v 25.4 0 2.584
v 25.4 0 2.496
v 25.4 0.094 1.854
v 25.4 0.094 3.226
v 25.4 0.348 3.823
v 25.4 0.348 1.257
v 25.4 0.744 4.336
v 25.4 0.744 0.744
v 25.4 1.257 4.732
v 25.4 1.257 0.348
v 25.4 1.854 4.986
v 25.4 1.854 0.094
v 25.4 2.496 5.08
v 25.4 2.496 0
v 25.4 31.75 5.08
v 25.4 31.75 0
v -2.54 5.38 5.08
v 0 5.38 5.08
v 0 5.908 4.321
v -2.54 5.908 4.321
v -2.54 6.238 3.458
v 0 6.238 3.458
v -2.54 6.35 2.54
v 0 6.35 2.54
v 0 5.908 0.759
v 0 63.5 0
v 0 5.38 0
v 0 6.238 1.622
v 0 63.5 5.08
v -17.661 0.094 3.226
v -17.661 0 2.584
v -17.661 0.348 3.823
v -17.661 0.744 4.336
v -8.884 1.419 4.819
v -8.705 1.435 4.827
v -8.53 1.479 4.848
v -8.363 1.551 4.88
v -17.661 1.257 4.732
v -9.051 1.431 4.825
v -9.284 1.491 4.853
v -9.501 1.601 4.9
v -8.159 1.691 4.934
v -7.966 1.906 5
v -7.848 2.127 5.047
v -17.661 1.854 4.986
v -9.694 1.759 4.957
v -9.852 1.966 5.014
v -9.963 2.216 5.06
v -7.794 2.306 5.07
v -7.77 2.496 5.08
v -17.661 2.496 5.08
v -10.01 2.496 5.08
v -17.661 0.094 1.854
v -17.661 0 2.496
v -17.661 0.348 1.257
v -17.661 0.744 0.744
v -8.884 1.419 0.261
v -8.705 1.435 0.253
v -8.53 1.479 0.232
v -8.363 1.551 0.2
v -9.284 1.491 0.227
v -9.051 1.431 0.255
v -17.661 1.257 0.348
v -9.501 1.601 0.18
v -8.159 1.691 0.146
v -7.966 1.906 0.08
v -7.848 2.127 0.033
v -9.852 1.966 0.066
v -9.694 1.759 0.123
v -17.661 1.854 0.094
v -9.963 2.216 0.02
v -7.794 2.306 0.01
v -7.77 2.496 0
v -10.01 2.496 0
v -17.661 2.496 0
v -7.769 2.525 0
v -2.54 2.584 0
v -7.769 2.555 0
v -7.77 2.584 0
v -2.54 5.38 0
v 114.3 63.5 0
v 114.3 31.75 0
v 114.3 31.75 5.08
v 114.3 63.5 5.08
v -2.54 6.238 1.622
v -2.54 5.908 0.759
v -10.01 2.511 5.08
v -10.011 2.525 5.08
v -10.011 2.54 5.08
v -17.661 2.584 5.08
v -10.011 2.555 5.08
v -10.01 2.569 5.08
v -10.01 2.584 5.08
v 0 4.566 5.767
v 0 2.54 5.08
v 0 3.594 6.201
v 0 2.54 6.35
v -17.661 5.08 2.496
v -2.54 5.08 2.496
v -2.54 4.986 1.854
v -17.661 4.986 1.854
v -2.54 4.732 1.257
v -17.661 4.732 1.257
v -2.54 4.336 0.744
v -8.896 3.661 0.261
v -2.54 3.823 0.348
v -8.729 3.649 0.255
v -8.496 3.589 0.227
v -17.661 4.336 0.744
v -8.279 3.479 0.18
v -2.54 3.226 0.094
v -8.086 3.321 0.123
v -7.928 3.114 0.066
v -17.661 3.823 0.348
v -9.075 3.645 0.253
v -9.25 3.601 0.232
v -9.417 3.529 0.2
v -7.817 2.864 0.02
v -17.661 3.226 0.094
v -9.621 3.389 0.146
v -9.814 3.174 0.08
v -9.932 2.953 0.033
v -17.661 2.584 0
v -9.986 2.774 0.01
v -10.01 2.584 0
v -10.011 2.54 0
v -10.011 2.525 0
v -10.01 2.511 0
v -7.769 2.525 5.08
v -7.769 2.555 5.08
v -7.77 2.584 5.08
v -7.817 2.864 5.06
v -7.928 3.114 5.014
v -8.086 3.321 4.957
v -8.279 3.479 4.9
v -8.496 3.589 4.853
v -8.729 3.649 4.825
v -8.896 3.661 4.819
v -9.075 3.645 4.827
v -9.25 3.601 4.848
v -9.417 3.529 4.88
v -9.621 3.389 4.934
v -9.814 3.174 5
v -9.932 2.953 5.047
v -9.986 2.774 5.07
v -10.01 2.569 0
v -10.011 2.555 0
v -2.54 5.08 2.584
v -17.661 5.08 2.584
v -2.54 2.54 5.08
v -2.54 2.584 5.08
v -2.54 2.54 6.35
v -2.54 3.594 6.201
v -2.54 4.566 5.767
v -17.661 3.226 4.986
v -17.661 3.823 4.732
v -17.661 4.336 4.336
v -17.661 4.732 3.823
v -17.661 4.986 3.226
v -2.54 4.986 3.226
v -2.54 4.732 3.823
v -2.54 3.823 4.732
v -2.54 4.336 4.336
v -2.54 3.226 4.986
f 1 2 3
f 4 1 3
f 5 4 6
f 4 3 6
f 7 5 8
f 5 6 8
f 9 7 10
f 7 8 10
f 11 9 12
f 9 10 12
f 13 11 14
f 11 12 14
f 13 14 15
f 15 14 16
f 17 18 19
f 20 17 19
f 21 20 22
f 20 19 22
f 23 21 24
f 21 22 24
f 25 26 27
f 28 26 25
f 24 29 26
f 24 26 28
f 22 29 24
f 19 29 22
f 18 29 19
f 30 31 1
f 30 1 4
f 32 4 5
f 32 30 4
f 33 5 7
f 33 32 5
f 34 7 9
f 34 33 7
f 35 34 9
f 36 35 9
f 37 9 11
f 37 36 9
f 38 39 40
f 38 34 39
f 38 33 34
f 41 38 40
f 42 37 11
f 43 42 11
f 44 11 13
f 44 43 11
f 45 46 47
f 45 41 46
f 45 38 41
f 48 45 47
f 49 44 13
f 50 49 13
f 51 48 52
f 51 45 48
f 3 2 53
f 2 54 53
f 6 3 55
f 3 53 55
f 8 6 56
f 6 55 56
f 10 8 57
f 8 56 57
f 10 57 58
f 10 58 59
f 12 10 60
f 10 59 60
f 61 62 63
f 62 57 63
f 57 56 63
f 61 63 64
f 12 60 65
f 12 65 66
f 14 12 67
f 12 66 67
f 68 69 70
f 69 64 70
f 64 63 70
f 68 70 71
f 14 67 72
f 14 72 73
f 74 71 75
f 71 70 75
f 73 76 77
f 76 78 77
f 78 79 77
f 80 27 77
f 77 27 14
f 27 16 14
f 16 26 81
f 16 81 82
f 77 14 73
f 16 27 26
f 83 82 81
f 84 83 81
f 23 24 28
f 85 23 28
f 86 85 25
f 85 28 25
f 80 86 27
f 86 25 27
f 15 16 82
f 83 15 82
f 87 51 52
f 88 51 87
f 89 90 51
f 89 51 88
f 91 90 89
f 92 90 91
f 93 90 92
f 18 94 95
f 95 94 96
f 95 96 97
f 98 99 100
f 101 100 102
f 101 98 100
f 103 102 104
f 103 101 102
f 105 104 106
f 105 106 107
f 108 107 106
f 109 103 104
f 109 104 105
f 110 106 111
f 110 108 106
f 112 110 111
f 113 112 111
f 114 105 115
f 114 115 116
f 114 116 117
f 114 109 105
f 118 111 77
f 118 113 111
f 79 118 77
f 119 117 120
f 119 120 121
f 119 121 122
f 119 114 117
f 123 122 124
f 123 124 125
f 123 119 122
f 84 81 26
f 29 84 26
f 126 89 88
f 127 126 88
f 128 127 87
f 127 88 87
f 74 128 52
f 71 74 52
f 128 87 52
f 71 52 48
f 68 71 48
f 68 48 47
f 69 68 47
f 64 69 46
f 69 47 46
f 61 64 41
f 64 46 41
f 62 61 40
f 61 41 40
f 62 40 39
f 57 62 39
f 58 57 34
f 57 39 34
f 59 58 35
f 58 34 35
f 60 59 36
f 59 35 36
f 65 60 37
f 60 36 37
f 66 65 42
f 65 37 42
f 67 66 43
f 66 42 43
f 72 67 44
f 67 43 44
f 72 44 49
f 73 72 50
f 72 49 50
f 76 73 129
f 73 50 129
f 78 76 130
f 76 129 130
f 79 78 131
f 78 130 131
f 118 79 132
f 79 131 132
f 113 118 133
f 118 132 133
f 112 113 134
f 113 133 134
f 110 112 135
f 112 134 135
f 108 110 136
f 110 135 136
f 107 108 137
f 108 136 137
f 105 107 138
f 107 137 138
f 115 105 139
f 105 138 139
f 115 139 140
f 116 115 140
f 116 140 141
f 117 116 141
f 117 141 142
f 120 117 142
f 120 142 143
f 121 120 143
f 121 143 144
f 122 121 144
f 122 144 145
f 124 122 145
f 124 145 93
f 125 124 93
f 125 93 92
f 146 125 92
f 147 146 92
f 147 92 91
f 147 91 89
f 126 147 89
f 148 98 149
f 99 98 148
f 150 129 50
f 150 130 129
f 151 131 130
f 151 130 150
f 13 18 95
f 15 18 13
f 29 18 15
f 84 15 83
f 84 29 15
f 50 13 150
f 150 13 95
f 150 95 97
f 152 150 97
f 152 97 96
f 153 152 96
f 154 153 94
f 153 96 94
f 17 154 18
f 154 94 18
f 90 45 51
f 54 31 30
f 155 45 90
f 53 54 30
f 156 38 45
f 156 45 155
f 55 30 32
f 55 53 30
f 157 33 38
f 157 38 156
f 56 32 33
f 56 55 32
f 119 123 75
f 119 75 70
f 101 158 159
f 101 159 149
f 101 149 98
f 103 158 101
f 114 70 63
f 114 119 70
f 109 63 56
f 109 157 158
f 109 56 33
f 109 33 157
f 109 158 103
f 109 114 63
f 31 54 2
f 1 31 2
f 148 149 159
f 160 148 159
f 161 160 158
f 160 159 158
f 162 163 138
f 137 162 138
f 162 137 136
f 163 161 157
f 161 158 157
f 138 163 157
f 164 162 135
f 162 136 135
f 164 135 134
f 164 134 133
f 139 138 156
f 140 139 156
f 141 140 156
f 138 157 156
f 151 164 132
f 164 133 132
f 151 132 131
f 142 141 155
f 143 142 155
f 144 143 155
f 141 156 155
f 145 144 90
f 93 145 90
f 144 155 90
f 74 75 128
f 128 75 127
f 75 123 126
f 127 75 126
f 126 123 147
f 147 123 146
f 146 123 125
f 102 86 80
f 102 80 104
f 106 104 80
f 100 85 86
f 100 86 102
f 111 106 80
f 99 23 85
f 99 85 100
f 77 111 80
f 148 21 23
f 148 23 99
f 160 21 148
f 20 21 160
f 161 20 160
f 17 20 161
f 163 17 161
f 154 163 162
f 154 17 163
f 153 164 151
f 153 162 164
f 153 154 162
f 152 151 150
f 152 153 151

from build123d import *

# Parameters (mm, degrees)
F0_W        = 17.6611579955
F0_H        = 5.08
F1_DEPTH    = 5.08
F2_T1_DEPTH = 55.76598658
F2_T3_DEPTH = 24.0135722877
F4_DEPTH    = 5.081
F6_DEPTH    = 2.54


# Not quite as in the source:
# - a fillet or chamfer that OpenCascade refuses, or shapes differently, is made with other operations: its cross-section is extruded or revolved along the edge and cut away or added


with BuildPart() as f1:
    # F0 (on Top) → F1 (new body)
    with BuildSketch(Plane.XY):
        with Locations((-8.8305789977, 2.54)):
            Rectangle(F0_W, F0_H)
        Polygon((0, 5.08), (0, 0), (25.4, 0), (25.4, 31.75), (88.9, 31.75), (114.3, 31.75), (114.3, 63.5), (0, 63.5), (0, 28.7528), align=None)
    extrude(amount=F1_DEPTH)

    # F2: fillet of radius 2.54 on 4 edges, made by hand

    # F2_s2 → F2_t1 (cut)
    with BuildSketch(Plane.YZ.offset(-24.0135722877)):
        with BuildLine():
            ThreePointArc((-0.0004, 2.5390343146), (0.7439487758, 4.3360512242), (2.5409656854, 5.0804))
            Line((2.5409656854, 5.0804), (2.5409656854, 5.3345365685))
            ThreePointArc((2.5409656854, 5.3345365685), (1.2704828427, 5.3341365685), (0, 5.3341365685))
            Line((0, 5.3341365685), (-0.2541365685, 5.08))
            ThreePointArc((-0.2541365685, 5.08), (-0.2541365685, 3.8095171573), (-0.2545365685, 2.5390343146))
            Line((-0.2545365685, 2.5390343146), (-0.0004, 2.5390343146))
        make_face()
        with BuildLine():
            ThreePointArc((-0.0004, 2.5409656854), (0.7439487758, 0.7439487758), (2.5409656854, -0.0004))
            Line((2.5409656854, -0.0004), (2.5409656854, -0.2545365685))
            ThreePointArc((2.5409656854, -0.2545365685), (1.2704828427, -0.2541365685), (0, -0.2541365685))
            Line((0, -0.2541365685), (-0.2541365685, 0))
            ThreePointArc((-0.2541365685, 0), (-0.2541365685, 1.2704828427), (-0.2545365685, 2.5409656854))
            Line((-0.2545365685, 2.5409656854), (-0.0004, 2.5409656854))
        make_face()
    extrude(amount=F2_T1_DEPTH, mode=Mode.SUBTRACT)

    # F2_s4 → F2_t3 (cut)
    with BuildSketch(Plane.YZ.offset(-24.0135722877)):
        with BuildLine():
            ThreePointArc((5.0804, 2.5390343146), (4.3360512242, 4.3360512242), (2.5390343146, 5.0804))
            Line((2.5390343146, 5.0804), (2.5390343146, 5.3345365685))
            ThreePointArc((2.5390343146, 5.3345365685), (3.8095171573, 5.3341365685), (5.08, 5.3341365685))
            Line((5.08, 5.3341365685), (5.3341365685, 5.08))
            ThreePointArc((5.3341365685, 5.08), (5.3341365685, 3.8095171573), (5.3345365685, 2.5390343146))
            Line((5.3345365685, 2.5390343146), (5.0804, 2.5390343146))
        make_face()
        with BuildLine():
            ThreePointArc((5.0804, 2.5409656854), (4.3360512242, 0.7439487758), (2.5390343146, -0.0004))
            Line((2.5390343146, -0.0004), (2.5390343146, -0.2545365685))
            ThreePointArc((2.5390343146, -0.2545365685), (3.8095171573, -0.2541365685), (5.08, -0.2541365685))
            Line((5.08, -0.2541365685), (5.3341365685, 0))
            ThreePointArc((5.3341365685, 0), (5.3341365685, 1.2704828427), (5.3345365685, 2.5409656854))
            Line((5.3345365685, 2.5409656854), (5.0804, 2.5409656854))
        make_face()
    extrude(amount=F2_T3_DEPTH, mode=Mode.SUBTRACT)

    # F3 (on face) → F4 (cut, through all)
    with BuildSketch(Plane.XY.offset(5.08)):
        with BuildLine():
            ThreePointArc((-7.7692847717, 2.54), (-8.89, 3.6607152283), (-10.0107152283, 2.54))
            Line((-10.0107152283, 2.54), (-7.7692847717, 2.54))
        make_face()
        with BuildLine():
            Line((-7.7692847717, 2.54), (-10.0107152283, 2.54))
            ThreePointArc((-10.0107152283, 2.54), (-8.89, 1.4192847717), (-7.7692847717, 2.54))
        make_face()
    extrude(amount=-F4_DEPTH, mode=Mode.SUBTRACT)

    # F5 (on face) → F6 (join)
    with BuildSketch(Plane(origin=(0, 0, 0), x_dir=(0, -1, 0), z_dir=(-1, 0, 0))):
        with BuildLine():
            Line((-2.54, 2.54), (-2.54, 6.35))
            ThreePointArc((-2.54, 6.35), (-4.0954259867, 6.0180382402), (-5.3798063314, 5.08))
            Line((-5.3798063314, 5.08), (-2.5841223678, 5.08))
            ThreePointArc((-2.5841223678, 5.08), (-4.3360512242, 4.3360512242), (-5.08, 2.5841223678))
            Line((-5.08, 2.5841223678), (-5.08, 2.54))
            Line((-5.08, 2.54), (-2.54, 2.54))
        make_face()
        with BuildLine():
            ThreePointArc((-6.35, 2.54), (-6.0991966876, 1.180507838), (-5.3798063314, 0))
            Line((-5.3798063314, 0), (-2.5841223678, 0))
            ThreePointArc((-2.5841223678, 0), (-4.3360512242, 0.7439487758), (-5.08, 2.4958776322))
            Line((-5.08, 2.4958776322), (-5.08, 2.54))
            Line((-5.08, 2.54), (-6.35, 2.54))
        make_face()
        with BuildLine():
            Line((-2.5841223678, 5.08), (-5.3798063314, 5.08))
            ThreePointArc((-5.3798063314, 5.08), (-6.0991966876, 3.899492162), (-6.35, 2.54))
            Line((-6.35, 2.54), (-5.08, 2.54))
            Line((-5.08, 2.54), (-5.08, 2.5841223678))
            ThreePointArc((-5.08, 2.5841223678), (-4.3360512242, 4.3360512242), (-2.5841223678, 5.08))
        make_face()
        with BuildLine():
            Line((-2.54, 0), (-2.54, 2.54))
            Line((-2.54, 2.54), (-5.08, 2.54))
            Line((-5.08, 2.54), (-5.08, 2.4958776322))
            ThreePointArc((-5.08, 2.4958776322), (-4.3360512242, 0.7439487758), (-2.5841223678, 0))
            Line((-2.5841223678, 0), (-2.54, 0))
        make_face()
    extrude(amount=F6_DEPTH)


solid = f1.part
